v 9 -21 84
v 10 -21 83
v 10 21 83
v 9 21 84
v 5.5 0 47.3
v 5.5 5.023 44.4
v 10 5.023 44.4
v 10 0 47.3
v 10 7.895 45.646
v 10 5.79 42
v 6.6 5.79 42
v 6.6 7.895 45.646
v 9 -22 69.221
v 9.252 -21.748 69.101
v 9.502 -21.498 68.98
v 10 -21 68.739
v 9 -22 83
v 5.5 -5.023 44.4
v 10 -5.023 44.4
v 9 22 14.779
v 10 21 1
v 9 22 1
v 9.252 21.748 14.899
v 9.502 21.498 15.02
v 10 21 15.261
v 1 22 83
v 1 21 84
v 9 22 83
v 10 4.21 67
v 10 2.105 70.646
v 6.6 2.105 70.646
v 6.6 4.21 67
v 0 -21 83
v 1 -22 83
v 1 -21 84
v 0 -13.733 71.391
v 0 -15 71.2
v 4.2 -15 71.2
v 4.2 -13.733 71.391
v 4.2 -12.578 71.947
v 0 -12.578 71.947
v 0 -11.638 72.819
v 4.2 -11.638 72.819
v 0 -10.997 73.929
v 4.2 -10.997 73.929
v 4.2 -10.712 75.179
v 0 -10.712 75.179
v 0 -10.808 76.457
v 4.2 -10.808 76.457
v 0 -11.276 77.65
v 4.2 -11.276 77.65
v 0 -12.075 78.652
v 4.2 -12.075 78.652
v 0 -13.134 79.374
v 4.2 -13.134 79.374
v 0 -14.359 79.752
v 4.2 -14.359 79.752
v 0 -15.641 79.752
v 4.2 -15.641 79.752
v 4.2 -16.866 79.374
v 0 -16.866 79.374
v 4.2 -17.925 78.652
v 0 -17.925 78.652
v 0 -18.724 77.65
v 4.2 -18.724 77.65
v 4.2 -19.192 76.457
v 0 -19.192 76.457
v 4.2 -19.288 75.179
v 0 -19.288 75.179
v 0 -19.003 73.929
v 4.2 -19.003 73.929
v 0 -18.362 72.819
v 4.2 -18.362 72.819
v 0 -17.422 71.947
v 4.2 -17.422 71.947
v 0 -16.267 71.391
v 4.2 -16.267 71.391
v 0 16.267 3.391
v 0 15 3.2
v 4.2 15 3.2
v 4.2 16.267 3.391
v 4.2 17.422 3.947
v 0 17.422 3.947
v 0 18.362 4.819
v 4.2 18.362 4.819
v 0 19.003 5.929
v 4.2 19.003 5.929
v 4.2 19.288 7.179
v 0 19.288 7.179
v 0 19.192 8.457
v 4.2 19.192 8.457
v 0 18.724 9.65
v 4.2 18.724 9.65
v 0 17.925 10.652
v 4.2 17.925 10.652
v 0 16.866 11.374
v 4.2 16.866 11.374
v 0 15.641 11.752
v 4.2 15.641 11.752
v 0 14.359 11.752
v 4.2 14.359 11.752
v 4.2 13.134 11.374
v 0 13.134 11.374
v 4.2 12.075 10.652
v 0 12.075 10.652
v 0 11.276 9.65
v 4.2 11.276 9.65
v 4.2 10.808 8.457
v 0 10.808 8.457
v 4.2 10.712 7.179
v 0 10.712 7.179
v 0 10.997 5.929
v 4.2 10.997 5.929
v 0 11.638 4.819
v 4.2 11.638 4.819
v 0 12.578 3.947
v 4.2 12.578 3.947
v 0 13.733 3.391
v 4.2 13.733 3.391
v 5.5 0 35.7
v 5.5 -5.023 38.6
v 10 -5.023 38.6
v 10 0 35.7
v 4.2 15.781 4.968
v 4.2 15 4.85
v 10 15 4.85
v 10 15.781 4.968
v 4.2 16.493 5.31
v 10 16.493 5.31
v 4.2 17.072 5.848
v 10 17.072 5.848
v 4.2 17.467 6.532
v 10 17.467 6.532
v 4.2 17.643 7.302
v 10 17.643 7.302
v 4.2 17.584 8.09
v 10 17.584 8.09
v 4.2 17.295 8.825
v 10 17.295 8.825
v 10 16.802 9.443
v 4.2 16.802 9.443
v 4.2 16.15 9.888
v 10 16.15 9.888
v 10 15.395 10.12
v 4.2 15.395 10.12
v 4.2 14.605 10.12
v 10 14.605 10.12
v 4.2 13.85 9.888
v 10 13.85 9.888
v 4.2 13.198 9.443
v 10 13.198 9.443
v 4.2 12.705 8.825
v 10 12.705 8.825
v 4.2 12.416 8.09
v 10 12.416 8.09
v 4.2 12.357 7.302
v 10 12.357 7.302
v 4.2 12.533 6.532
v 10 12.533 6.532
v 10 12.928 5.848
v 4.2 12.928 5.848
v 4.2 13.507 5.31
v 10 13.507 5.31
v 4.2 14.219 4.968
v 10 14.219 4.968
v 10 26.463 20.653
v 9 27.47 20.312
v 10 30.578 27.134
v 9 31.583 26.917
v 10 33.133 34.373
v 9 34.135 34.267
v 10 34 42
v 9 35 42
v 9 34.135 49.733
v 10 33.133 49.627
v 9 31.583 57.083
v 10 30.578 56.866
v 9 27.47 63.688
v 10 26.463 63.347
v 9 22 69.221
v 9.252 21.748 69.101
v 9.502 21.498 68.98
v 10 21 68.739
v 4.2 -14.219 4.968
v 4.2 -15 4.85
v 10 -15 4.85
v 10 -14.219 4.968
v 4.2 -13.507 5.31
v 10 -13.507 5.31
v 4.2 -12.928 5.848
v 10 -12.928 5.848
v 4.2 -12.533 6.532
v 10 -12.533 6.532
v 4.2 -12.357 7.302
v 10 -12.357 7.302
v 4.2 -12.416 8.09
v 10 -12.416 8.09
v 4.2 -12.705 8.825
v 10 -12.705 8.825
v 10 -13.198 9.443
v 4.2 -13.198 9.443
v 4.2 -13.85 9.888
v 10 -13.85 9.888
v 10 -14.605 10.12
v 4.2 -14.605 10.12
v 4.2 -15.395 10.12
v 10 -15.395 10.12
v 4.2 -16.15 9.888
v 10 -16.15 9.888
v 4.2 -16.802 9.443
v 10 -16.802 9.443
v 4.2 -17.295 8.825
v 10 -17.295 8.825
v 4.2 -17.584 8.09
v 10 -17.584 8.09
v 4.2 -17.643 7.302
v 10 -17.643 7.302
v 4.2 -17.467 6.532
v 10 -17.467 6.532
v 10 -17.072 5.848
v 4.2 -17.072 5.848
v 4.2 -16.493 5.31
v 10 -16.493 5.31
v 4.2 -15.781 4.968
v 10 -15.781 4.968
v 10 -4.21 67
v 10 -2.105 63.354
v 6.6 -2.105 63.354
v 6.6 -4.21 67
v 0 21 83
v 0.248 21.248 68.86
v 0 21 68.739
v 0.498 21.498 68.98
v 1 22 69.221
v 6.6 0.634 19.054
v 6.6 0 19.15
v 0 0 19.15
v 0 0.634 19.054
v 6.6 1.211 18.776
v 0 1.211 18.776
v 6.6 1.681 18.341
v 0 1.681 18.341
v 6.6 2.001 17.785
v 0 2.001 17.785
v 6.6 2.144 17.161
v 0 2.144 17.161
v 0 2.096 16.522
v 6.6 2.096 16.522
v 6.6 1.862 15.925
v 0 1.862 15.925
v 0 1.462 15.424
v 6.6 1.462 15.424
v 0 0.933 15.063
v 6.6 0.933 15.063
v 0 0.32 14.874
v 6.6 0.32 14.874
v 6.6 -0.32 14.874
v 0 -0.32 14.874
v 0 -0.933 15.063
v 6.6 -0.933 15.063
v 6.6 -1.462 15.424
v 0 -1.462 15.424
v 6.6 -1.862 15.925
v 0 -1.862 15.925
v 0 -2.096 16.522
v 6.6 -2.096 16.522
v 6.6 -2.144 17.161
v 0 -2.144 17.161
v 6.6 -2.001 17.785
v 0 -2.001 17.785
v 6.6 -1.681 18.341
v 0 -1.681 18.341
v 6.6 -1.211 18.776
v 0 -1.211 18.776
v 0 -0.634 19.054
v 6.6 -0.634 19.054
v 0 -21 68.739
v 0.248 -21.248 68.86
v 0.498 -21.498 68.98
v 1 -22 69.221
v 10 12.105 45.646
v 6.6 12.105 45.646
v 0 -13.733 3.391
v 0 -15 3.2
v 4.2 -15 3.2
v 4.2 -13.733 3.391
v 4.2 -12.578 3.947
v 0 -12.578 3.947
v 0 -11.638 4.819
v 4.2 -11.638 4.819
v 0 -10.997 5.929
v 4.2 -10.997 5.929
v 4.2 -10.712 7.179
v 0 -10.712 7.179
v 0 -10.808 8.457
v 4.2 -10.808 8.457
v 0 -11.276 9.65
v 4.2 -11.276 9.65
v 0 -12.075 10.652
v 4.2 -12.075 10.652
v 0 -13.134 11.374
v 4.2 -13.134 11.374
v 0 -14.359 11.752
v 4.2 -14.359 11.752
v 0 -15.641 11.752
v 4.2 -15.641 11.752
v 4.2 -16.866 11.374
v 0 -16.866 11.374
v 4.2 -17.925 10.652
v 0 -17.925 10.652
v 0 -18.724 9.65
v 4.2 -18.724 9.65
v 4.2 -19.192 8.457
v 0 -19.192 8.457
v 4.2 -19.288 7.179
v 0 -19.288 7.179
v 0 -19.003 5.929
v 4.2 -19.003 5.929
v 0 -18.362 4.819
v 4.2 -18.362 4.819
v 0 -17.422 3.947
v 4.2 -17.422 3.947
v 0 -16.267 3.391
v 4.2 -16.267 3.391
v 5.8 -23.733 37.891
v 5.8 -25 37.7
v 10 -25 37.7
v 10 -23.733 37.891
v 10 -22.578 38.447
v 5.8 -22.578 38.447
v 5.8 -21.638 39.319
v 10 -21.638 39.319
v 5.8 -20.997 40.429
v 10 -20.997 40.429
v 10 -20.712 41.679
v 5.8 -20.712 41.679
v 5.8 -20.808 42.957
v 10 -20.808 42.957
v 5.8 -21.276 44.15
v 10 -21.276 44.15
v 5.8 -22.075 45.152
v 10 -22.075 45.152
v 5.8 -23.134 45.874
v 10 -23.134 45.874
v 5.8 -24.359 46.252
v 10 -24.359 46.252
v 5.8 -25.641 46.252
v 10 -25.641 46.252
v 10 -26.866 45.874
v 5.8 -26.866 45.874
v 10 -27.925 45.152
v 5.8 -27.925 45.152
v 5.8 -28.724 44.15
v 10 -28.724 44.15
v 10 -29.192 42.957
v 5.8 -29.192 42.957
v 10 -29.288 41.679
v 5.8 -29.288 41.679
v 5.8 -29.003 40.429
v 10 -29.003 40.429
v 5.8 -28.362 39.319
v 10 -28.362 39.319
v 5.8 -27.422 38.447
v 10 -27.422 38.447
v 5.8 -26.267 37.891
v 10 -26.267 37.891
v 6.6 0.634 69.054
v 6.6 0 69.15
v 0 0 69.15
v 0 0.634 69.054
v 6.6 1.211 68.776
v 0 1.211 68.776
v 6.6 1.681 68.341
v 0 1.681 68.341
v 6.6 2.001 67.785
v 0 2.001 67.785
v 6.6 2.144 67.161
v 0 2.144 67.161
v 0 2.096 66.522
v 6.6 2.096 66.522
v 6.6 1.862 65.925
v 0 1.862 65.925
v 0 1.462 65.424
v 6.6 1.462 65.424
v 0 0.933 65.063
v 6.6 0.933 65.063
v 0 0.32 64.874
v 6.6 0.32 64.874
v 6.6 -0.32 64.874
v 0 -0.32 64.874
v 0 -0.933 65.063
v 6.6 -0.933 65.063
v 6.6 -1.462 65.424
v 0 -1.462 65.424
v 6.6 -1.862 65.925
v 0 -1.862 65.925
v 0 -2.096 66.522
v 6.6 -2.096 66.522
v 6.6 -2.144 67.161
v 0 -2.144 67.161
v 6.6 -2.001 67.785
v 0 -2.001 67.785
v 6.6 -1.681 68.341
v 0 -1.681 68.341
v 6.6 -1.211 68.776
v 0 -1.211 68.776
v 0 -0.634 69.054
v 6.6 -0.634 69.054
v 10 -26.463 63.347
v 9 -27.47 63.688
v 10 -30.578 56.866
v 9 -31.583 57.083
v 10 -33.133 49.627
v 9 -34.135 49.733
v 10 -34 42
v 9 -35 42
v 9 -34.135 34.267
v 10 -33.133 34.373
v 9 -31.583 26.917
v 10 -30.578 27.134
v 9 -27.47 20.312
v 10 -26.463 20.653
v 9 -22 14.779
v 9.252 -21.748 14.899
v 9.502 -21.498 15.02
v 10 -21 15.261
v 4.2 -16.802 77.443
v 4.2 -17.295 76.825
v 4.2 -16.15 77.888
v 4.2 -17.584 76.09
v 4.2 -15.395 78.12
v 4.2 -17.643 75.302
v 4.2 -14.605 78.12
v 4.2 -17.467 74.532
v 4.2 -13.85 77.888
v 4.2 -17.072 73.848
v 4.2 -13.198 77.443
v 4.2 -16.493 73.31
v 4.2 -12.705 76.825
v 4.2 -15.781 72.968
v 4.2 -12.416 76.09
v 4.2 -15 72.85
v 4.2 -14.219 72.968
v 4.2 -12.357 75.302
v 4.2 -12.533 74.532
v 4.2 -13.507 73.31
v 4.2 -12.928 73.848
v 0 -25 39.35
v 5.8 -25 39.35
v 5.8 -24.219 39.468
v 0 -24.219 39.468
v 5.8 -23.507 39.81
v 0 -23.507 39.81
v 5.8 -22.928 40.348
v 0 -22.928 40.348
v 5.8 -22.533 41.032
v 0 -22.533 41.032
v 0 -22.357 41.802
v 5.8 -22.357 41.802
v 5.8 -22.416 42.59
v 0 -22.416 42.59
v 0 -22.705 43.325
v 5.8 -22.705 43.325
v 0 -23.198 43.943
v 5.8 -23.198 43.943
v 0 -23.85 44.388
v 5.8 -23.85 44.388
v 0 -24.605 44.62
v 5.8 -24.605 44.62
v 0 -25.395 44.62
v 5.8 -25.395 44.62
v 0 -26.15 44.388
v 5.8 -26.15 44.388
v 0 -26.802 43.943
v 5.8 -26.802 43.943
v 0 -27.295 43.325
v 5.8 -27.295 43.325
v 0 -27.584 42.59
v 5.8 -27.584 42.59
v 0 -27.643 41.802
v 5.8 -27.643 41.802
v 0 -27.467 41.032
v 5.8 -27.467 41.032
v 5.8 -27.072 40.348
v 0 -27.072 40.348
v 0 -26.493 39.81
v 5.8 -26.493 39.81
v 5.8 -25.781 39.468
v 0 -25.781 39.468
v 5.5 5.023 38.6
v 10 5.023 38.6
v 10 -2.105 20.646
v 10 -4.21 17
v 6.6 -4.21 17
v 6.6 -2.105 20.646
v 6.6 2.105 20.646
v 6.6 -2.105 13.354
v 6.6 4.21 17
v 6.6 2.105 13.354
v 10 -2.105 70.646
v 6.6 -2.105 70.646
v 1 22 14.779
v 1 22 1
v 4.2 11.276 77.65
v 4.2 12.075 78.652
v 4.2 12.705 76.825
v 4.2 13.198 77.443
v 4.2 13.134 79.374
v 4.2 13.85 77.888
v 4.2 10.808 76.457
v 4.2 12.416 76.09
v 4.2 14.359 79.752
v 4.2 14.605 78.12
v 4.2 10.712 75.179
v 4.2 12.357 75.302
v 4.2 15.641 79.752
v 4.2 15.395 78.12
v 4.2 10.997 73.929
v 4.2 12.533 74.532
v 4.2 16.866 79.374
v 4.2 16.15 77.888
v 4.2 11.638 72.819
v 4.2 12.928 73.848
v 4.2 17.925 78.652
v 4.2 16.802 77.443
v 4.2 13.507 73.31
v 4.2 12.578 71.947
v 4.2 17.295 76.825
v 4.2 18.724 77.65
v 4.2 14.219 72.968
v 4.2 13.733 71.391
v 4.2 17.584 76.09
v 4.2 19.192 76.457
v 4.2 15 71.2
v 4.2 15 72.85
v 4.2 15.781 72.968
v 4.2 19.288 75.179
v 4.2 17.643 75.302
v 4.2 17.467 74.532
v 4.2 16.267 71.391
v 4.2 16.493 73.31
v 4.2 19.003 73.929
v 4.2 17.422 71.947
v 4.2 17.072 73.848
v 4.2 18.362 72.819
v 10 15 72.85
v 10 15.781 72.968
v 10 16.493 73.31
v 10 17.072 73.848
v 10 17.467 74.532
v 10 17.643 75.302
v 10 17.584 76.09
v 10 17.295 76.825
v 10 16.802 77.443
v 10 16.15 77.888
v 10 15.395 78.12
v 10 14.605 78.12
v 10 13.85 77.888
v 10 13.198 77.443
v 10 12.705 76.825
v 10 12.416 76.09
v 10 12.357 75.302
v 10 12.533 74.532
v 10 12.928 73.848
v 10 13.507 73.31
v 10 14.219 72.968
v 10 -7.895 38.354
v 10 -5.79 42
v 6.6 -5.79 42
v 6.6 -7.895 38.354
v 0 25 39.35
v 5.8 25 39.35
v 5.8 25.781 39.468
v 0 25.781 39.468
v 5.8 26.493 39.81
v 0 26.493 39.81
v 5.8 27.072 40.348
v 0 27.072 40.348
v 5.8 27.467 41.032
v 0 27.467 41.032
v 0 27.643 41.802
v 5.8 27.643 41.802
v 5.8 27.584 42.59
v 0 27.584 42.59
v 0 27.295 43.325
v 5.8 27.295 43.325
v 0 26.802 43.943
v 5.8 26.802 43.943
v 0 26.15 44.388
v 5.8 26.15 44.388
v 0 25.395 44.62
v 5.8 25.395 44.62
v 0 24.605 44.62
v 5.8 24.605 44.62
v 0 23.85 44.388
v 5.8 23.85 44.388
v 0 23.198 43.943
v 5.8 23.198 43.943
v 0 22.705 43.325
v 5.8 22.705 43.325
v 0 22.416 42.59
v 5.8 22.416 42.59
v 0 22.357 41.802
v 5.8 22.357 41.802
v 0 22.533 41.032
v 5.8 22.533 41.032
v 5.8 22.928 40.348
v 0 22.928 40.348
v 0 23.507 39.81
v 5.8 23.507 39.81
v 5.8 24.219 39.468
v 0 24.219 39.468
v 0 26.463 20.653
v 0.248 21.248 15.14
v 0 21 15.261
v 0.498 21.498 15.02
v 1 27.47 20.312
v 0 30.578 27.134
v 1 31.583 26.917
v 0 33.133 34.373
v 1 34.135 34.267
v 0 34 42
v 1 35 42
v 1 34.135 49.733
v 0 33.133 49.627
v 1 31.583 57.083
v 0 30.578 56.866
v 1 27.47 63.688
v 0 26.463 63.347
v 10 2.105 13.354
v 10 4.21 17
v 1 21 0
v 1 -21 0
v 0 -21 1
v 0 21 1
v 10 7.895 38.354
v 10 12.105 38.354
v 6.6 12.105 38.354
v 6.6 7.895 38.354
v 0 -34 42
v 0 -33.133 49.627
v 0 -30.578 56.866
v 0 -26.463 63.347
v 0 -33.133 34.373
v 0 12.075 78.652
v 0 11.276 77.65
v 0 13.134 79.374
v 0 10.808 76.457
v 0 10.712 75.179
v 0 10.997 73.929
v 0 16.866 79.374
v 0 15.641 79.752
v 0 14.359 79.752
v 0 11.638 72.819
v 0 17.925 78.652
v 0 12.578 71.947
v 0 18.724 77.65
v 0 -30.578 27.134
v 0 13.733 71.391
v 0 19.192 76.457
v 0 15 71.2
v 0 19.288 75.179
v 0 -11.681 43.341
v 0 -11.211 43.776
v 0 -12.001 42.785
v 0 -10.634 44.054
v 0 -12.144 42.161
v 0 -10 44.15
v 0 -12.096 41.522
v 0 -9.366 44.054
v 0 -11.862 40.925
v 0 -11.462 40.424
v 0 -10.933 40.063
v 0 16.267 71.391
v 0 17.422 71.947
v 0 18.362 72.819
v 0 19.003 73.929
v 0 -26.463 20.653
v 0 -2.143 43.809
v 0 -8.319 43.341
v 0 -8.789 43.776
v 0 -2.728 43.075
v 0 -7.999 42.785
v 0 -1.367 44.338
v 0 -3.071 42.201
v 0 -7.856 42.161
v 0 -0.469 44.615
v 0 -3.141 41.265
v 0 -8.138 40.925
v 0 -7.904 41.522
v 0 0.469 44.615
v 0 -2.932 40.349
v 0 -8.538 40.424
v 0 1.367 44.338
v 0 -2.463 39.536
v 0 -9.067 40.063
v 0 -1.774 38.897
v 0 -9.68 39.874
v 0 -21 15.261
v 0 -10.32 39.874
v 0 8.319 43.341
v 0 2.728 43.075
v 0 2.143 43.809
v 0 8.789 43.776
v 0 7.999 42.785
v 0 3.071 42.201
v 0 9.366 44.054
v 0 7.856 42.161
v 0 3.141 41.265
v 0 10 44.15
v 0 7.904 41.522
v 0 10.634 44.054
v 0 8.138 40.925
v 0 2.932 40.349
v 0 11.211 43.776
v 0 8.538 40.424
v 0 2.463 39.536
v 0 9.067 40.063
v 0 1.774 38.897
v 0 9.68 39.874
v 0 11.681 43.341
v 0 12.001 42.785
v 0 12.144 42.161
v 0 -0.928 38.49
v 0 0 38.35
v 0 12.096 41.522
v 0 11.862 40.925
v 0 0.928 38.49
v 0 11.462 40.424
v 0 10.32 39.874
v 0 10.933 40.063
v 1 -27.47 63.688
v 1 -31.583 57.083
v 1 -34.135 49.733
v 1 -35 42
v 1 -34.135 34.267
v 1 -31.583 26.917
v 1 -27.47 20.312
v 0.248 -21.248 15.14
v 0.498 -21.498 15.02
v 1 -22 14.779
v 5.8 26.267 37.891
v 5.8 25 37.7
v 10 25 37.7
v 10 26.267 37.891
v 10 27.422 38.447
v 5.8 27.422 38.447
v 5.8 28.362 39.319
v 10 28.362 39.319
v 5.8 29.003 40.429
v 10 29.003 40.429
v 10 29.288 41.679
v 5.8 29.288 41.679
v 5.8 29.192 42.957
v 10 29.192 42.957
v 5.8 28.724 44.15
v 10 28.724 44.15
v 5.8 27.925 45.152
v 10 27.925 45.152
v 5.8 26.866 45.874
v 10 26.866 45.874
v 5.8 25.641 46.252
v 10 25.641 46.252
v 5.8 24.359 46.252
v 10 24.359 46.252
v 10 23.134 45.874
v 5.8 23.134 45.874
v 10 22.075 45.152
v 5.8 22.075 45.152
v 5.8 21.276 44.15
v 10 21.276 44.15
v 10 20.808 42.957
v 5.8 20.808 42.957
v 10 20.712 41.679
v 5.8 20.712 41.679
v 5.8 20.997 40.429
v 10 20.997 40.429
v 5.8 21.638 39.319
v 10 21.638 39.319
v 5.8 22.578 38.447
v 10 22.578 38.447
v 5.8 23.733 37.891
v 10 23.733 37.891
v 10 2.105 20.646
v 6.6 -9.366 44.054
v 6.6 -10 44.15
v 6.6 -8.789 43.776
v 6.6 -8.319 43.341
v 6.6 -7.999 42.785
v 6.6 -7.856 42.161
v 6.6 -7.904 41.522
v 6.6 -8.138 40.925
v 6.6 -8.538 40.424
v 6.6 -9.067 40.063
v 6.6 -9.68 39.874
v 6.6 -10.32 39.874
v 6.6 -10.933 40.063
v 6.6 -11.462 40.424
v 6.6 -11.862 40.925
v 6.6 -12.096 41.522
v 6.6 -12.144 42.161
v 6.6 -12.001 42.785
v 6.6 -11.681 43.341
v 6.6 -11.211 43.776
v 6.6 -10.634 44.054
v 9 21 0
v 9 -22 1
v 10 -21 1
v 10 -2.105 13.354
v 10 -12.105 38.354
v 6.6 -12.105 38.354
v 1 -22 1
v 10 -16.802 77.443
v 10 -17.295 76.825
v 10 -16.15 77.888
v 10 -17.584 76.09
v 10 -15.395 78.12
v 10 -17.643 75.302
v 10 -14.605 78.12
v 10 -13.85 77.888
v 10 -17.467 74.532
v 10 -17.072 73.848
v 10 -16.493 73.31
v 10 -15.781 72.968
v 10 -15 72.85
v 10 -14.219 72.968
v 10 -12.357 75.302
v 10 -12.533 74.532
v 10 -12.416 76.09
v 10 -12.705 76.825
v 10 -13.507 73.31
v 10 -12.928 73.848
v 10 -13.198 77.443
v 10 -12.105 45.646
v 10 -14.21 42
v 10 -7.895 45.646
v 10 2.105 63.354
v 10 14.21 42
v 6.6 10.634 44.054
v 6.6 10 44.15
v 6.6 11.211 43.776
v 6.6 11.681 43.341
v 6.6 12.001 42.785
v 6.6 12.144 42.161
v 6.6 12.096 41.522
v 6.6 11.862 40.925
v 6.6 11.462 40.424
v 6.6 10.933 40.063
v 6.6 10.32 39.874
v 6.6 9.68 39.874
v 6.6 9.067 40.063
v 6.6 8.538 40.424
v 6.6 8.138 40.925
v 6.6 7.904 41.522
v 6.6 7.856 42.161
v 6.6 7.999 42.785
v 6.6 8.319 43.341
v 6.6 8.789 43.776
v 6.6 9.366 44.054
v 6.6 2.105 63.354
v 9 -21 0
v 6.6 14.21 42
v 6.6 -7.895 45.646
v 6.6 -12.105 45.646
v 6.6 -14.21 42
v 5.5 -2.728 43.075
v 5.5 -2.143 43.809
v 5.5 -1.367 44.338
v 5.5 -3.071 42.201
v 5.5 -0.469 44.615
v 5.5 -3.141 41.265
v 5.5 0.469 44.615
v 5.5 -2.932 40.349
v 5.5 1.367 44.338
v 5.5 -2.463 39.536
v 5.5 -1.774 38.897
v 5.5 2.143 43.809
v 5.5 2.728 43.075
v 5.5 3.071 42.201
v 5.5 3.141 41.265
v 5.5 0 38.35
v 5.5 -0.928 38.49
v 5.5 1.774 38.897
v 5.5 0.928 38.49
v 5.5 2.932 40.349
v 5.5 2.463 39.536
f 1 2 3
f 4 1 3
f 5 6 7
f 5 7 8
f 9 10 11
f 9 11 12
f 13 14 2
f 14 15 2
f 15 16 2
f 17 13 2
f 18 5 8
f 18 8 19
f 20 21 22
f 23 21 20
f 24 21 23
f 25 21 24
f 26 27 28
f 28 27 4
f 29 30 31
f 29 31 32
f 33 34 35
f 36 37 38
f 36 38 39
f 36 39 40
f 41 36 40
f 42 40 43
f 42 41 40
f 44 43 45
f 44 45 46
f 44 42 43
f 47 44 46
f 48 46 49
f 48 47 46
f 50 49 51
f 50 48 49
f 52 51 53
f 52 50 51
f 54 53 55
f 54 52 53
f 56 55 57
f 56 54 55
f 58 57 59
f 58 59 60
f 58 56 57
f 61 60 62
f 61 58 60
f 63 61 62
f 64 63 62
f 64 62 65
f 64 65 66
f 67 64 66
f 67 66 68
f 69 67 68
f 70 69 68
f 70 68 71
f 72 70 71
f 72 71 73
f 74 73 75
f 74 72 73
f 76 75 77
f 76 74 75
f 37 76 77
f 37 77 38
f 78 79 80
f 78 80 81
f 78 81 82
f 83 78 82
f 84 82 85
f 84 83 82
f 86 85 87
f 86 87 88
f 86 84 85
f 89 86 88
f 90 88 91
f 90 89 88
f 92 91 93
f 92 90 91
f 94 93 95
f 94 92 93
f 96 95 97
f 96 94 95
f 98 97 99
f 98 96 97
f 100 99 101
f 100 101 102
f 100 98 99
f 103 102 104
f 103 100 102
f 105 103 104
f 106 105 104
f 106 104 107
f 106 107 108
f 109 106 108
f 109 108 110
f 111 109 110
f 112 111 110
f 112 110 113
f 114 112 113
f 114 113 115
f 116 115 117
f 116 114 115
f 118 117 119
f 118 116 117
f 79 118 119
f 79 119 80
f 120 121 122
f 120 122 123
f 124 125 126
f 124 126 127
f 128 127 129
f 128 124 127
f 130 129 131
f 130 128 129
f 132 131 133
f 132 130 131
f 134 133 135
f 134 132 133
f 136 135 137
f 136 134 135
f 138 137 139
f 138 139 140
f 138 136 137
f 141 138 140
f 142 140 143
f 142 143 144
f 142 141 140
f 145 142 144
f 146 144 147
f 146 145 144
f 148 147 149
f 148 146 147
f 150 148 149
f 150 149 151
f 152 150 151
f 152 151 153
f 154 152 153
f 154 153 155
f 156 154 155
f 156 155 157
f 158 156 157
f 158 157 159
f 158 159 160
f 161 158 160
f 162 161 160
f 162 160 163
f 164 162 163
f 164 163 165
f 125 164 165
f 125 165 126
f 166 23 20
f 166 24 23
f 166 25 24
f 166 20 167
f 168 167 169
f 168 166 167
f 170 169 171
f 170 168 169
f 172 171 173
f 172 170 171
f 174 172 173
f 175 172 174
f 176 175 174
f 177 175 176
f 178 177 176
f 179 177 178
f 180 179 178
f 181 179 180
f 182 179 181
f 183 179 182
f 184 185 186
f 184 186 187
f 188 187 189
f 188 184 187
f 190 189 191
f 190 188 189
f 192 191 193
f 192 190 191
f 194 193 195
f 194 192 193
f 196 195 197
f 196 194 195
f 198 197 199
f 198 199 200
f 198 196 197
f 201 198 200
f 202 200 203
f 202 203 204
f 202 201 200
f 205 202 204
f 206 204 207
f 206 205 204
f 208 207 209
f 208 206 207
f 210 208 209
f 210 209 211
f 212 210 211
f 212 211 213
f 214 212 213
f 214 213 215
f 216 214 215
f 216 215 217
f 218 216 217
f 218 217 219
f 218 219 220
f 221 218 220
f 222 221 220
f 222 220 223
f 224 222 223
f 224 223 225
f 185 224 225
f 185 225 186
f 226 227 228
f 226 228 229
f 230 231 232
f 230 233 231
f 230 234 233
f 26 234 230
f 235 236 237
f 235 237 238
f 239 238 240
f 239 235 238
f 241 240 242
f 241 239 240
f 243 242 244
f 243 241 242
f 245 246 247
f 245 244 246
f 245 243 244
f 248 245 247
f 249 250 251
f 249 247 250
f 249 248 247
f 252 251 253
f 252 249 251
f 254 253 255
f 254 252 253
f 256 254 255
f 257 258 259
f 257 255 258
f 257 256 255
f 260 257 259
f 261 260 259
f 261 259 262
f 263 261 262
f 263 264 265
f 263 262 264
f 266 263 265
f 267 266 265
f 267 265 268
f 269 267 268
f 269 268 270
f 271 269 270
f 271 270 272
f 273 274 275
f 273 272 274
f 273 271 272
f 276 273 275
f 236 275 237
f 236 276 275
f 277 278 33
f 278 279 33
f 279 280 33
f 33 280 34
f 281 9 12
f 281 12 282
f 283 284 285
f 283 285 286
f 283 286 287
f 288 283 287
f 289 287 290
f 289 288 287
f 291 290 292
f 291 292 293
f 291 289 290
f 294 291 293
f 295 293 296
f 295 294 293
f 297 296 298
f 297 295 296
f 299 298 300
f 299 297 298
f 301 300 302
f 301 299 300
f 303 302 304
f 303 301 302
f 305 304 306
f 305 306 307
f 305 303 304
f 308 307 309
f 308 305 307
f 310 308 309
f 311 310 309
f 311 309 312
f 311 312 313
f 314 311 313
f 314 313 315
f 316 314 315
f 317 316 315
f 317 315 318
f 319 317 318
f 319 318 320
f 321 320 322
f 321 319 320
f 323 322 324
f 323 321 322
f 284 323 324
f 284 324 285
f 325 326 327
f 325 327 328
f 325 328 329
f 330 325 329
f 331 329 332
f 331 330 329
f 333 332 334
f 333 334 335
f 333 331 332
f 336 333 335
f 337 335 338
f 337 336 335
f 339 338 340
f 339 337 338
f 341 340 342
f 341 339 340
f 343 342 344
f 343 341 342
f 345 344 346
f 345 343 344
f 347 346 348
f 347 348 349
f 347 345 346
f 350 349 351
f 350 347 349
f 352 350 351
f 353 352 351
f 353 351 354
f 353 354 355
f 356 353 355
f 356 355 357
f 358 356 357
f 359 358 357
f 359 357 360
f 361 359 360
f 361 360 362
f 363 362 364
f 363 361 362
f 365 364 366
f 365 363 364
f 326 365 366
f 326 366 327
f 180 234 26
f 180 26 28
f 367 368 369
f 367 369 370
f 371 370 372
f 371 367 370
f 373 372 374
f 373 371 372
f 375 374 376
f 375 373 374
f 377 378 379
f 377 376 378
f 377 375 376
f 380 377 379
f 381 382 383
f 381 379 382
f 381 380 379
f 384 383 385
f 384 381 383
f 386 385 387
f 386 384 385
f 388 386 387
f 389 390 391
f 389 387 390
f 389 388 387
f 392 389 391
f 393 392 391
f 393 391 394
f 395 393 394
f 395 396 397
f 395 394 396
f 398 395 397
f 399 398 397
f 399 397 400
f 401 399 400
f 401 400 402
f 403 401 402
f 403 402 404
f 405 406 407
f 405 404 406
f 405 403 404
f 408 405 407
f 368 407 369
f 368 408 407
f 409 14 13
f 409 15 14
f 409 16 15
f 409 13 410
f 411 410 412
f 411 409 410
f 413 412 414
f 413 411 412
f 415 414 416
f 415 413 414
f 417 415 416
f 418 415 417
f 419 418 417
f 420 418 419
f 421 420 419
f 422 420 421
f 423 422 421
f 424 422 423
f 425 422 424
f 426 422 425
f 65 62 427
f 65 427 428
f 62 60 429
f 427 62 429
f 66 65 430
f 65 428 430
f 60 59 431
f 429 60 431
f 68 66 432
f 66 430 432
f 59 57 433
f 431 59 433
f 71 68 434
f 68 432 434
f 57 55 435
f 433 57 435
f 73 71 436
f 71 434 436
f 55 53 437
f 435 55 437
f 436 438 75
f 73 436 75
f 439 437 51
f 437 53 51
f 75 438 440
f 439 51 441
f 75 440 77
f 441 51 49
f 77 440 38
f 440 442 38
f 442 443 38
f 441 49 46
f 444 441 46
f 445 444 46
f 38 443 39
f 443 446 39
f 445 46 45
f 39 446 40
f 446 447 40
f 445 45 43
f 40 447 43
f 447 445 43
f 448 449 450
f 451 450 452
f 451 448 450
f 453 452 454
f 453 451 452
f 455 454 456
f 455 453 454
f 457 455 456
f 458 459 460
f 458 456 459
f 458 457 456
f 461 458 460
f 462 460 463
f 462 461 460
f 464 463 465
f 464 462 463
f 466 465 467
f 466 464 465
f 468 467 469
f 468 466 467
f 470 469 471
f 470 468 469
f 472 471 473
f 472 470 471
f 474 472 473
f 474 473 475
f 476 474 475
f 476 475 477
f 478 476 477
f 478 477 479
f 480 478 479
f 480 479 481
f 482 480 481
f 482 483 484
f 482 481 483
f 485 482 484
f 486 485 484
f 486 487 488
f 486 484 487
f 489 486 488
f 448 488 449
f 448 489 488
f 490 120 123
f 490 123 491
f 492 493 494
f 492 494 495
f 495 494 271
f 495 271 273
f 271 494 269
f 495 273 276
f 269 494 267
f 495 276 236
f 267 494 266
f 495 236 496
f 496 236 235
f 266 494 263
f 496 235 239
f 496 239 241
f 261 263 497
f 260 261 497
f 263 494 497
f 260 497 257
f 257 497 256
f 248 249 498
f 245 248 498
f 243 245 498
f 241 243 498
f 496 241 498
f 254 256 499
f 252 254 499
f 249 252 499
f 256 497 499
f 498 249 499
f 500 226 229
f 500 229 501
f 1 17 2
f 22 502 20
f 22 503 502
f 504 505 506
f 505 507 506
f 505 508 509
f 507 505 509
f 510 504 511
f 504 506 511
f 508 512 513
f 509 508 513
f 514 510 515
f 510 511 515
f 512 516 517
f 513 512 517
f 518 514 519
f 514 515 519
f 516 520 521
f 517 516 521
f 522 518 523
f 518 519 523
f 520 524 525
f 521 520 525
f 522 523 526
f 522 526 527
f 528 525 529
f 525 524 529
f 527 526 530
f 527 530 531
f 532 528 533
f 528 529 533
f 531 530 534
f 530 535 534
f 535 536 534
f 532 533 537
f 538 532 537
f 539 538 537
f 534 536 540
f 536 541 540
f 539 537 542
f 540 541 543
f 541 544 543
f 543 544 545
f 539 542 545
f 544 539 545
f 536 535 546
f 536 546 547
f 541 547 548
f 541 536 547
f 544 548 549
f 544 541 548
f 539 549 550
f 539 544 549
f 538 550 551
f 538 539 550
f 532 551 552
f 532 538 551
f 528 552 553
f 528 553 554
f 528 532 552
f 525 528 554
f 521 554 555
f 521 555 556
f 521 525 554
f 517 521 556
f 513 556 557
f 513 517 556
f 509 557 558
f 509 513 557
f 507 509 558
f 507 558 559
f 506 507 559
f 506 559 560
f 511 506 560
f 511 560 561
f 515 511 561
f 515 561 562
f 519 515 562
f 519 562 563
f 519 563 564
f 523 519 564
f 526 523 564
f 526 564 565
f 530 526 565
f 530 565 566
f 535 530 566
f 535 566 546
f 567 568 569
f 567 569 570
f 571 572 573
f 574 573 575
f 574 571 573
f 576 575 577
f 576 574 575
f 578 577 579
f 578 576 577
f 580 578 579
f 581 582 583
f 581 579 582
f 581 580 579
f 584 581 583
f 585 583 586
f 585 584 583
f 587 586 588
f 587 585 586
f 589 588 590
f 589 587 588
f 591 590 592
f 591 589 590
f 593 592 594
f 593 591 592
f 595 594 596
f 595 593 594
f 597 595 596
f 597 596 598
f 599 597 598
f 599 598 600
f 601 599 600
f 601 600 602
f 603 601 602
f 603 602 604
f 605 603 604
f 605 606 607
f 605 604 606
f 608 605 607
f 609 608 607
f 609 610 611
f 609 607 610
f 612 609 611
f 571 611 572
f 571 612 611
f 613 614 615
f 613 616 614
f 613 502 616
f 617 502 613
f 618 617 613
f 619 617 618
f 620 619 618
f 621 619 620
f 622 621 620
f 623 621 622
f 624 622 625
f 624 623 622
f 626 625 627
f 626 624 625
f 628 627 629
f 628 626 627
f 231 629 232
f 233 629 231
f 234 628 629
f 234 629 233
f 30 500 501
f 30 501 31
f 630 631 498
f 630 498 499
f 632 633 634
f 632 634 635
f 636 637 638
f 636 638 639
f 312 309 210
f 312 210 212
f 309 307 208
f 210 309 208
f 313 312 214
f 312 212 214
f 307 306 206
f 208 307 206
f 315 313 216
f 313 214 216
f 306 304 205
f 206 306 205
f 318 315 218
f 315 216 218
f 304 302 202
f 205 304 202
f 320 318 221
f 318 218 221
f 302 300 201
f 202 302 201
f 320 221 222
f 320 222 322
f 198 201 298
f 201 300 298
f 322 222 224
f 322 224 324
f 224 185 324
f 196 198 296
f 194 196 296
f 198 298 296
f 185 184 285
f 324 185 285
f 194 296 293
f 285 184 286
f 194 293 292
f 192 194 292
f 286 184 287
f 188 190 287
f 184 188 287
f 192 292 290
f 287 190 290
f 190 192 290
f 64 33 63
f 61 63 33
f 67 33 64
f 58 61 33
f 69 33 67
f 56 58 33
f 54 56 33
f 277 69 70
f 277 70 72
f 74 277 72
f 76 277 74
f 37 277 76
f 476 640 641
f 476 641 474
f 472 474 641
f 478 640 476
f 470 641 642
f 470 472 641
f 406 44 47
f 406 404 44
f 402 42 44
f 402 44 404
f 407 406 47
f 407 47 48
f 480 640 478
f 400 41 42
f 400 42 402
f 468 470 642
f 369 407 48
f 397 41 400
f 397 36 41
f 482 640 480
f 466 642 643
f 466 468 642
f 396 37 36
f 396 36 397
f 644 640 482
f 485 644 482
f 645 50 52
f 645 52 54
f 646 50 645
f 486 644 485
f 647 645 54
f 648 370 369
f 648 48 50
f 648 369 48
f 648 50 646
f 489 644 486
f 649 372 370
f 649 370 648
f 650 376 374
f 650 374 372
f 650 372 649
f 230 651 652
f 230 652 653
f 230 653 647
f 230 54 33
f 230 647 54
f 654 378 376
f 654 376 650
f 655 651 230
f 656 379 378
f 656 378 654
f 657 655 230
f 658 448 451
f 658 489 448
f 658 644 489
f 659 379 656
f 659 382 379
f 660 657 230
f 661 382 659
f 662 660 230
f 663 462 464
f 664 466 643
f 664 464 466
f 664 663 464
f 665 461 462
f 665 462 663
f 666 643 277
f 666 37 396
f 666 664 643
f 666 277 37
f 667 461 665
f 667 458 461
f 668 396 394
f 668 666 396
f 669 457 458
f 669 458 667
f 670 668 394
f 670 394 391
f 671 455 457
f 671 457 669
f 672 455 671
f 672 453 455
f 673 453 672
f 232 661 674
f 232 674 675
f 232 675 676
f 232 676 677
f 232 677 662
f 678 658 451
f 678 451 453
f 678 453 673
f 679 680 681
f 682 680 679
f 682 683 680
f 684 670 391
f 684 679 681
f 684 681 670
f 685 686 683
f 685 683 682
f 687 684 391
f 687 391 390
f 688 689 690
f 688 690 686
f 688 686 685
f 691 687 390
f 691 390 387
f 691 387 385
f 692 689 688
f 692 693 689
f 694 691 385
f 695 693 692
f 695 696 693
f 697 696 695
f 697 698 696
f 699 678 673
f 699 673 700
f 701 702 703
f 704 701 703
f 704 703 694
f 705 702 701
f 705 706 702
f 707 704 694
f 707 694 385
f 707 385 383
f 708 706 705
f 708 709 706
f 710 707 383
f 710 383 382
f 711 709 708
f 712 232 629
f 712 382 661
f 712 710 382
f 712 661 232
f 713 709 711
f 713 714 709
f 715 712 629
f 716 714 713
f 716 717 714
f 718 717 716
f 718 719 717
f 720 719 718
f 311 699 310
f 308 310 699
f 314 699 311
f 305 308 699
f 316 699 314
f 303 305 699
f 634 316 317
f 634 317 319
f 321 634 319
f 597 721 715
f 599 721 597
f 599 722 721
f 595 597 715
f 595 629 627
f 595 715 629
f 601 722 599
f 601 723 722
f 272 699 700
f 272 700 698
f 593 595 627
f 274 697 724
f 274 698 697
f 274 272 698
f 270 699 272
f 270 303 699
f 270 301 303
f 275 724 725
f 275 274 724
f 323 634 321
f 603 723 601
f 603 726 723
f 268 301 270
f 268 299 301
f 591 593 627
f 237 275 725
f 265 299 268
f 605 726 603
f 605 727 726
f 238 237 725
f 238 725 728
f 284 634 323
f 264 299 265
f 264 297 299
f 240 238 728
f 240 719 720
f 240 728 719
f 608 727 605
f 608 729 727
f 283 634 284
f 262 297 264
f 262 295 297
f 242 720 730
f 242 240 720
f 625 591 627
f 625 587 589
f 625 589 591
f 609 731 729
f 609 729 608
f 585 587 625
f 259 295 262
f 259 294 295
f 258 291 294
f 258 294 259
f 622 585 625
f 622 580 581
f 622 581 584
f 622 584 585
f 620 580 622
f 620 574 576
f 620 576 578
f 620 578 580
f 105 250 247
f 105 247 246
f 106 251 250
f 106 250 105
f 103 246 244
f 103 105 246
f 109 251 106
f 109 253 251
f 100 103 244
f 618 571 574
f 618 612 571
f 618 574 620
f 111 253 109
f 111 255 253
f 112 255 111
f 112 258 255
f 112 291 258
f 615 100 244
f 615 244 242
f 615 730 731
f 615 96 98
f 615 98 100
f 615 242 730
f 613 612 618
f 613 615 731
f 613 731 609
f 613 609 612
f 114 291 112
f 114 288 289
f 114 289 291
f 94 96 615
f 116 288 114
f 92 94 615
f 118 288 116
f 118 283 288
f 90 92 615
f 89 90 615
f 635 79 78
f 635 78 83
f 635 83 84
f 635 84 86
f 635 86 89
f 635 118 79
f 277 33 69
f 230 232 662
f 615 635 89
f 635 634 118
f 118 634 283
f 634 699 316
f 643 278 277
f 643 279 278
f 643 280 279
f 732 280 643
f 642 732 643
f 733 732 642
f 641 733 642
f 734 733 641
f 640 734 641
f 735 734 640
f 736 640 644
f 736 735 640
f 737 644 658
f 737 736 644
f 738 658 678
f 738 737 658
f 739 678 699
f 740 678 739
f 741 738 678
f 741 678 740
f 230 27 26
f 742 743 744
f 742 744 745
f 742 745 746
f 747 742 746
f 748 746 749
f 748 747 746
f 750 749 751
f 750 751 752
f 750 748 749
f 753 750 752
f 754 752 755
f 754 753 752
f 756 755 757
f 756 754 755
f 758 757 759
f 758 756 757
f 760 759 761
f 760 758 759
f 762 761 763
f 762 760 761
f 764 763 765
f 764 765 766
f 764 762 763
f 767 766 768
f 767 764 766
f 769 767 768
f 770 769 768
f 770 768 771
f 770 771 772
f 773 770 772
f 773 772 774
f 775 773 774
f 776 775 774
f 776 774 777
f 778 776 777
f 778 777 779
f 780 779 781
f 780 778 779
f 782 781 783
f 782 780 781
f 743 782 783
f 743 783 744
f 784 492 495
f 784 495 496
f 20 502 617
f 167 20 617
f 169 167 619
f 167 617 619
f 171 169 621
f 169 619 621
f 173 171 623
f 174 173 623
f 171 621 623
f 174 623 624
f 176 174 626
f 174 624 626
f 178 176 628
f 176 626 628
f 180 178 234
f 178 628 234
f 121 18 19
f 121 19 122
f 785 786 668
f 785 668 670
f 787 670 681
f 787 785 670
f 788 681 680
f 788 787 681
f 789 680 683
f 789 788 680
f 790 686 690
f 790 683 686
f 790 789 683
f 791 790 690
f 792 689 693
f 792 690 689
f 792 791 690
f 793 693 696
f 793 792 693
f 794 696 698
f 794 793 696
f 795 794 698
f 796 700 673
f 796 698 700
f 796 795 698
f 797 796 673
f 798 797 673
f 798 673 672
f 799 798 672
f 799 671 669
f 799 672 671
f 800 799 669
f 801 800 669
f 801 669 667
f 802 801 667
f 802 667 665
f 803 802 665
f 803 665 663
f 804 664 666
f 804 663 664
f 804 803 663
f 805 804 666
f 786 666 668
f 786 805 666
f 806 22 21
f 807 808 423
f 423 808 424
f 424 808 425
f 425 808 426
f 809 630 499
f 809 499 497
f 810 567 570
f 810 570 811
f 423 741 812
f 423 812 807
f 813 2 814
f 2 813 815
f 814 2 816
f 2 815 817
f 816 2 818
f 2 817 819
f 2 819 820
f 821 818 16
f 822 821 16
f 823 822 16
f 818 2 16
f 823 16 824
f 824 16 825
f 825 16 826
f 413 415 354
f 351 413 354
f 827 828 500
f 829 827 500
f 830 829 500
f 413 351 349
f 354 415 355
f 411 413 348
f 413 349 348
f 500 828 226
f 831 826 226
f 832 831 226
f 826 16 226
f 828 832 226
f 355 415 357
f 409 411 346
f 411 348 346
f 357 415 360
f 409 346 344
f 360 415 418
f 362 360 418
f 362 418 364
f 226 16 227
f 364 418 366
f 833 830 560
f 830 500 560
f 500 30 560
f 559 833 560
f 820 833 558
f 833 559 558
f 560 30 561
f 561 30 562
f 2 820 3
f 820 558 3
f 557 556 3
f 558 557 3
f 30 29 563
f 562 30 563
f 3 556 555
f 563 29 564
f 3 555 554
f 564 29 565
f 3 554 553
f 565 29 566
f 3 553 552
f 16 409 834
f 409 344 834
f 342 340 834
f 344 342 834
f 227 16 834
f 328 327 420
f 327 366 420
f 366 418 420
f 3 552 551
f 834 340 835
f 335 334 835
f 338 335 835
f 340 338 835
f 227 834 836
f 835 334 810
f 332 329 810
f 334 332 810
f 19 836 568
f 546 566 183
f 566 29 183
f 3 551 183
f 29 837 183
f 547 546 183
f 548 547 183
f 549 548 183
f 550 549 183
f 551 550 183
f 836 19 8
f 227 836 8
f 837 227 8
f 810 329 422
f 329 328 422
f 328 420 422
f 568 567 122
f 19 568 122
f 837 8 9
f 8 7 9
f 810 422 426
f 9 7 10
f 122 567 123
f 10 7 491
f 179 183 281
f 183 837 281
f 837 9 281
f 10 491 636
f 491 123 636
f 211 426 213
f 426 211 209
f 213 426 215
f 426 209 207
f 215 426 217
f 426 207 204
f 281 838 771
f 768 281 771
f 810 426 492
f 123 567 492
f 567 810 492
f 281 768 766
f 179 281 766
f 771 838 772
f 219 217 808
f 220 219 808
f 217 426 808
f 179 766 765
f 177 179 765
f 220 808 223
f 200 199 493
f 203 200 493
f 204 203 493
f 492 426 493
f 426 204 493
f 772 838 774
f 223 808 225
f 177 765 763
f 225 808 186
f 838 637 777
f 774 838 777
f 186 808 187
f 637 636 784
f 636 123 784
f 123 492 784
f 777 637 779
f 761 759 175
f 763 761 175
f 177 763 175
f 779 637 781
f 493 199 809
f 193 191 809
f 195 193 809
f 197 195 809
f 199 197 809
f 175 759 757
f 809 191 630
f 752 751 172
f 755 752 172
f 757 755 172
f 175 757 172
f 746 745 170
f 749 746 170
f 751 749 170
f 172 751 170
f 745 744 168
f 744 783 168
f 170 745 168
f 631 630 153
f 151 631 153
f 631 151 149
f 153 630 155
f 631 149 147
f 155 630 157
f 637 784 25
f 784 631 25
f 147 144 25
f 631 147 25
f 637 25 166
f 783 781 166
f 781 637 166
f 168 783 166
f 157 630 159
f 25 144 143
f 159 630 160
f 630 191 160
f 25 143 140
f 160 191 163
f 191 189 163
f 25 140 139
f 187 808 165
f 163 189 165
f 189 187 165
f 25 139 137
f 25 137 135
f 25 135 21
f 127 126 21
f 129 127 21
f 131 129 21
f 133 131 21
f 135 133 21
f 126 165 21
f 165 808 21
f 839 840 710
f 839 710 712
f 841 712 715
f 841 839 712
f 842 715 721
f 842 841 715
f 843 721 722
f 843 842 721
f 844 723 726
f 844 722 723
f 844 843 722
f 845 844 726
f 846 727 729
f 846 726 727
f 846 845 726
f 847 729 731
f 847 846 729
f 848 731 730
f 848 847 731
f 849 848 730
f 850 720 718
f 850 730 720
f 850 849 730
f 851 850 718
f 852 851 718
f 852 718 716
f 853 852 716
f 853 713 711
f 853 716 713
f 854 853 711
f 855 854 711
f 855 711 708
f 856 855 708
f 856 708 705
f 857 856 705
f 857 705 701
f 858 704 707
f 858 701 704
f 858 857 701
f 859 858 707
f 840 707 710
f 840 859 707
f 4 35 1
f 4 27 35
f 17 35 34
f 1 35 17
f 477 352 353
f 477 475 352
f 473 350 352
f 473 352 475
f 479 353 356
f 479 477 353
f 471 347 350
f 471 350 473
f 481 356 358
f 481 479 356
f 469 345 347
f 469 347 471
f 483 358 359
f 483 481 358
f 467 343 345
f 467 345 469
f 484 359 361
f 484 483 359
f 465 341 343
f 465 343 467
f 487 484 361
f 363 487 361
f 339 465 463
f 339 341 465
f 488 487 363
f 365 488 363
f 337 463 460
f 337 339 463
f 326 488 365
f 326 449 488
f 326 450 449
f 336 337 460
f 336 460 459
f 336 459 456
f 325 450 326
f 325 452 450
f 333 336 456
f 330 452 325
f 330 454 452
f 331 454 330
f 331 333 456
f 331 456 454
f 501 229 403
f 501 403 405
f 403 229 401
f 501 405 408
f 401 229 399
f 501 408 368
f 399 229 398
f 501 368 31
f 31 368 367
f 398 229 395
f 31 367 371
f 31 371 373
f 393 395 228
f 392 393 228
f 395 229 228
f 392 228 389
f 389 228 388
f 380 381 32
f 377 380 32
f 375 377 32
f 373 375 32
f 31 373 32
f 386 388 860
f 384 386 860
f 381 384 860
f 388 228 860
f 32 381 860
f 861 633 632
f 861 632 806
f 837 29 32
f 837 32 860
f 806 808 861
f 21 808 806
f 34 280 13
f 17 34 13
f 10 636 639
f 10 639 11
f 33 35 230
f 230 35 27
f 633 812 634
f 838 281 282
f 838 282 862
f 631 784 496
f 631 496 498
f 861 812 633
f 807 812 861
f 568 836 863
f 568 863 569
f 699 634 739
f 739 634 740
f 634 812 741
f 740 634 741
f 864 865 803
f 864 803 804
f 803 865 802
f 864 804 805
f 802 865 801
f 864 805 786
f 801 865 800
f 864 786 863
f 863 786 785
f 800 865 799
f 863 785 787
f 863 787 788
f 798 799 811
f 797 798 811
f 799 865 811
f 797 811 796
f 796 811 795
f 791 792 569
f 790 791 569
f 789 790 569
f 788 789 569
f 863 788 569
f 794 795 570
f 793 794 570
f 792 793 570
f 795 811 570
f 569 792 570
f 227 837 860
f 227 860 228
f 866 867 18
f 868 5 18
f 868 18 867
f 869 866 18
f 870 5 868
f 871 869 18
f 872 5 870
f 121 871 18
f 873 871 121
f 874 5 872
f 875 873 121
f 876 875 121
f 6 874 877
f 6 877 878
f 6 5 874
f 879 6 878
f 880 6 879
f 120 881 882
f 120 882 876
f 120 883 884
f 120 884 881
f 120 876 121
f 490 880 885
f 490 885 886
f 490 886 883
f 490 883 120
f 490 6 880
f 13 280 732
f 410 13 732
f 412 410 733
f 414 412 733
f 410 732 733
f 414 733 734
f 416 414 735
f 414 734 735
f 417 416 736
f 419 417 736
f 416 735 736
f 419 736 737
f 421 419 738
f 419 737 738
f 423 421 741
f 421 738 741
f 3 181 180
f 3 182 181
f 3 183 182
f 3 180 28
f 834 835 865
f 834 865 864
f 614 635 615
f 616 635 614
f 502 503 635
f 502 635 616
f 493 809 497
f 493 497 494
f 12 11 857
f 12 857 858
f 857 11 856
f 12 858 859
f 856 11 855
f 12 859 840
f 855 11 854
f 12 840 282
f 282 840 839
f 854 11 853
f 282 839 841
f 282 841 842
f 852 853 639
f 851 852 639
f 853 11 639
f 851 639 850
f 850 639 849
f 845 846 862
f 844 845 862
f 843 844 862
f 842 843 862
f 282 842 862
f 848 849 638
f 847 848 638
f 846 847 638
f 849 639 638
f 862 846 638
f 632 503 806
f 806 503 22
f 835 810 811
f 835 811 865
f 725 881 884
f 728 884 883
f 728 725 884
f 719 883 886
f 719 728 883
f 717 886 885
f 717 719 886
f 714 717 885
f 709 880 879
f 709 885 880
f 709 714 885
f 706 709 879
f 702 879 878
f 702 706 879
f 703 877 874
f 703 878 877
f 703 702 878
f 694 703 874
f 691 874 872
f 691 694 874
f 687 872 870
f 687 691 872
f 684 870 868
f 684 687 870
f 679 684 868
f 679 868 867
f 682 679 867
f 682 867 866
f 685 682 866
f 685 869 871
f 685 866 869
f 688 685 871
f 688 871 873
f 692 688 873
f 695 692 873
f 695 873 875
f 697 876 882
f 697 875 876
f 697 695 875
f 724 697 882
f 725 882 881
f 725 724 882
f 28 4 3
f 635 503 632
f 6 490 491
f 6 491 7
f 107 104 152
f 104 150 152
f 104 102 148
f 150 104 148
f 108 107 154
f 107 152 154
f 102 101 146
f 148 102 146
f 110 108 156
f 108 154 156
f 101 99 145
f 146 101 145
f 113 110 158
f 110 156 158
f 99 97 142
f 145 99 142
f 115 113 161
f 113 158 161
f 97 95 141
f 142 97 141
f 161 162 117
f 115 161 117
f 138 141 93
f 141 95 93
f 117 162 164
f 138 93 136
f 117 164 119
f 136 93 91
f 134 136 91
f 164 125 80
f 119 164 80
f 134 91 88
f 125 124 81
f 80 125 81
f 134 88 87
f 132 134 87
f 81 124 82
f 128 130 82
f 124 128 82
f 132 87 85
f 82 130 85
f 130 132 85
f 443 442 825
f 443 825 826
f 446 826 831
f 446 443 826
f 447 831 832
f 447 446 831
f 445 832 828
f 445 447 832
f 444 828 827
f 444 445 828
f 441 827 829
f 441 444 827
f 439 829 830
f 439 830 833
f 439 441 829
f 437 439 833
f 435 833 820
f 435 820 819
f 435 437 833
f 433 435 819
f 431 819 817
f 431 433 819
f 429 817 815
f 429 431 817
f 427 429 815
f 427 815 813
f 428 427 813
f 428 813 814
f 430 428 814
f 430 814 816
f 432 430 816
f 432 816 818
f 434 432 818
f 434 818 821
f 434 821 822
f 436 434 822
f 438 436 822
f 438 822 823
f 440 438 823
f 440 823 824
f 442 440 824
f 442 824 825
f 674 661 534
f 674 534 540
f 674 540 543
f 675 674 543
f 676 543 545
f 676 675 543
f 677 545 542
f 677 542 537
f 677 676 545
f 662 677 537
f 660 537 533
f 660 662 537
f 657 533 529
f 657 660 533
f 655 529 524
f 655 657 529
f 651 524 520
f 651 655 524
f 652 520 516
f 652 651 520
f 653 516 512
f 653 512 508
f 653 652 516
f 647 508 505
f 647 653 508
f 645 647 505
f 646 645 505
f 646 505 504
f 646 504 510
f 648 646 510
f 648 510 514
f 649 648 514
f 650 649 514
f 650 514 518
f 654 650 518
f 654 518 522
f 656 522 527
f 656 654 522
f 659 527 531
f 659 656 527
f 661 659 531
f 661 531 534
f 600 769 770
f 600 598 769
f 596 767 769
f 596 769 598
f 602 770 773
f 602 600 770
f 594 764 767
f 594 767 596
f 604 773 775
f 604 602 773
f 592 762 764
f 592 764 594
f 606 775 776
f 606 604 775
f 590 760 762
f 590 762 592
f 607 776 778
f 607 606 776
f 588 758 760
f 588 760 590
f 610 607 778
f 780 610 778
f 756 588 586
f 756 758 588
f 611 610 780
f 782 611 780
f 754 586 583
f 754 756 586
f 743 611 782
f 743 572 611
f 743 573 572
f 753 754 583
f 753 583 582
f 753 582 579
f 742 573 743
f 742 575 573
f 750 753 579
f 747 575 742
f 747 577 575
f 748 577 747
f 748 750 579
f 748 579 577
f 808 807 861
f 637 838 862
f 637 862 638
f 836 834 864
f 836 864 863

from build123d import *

# Parameters (mm, degrees)
CYLINDER014005932_R                                                    = 2.65
CYLINDER014005932_DEPTH                                                = 10
CYLINDER014005933_R                                                    = 2.65
CYLINDER014005933_DEPTH                                                = 10
CYLINDER014005934_R                                                    = 2.65
CYLINDER014005934_DEPTH                                                = 10
CYLINDER014005935_R                                                    = 4.3
CYLINDER014005935_DEPTH                                                = 4.2
CYLINDER014005936_R                                                    = 4.3
CYLINDER014005936_DEPTH                                                = 4.2
CYLINDER014005937_R                                                    = 4.3
CYLINDER014005937_DEPTH                                                = 4.2
CYLINDER014005938_R                                                    = 4.3
CYLINDER014005938_DEPTH                                                = 4.2
CYLINDER014005939_R                                                    = 2.65
CYLINDER014005939_DEPTH                                                = 10
CYLINDER014005940_R                                                    = 2.65
CYLINDER014005940_DEPTH                                                = 10
CYLINDER014005941_R                                                    = 4.3
CYLINDER014005941_DEPTH                                                = 4.2
CYLINDER014005942_R                                                    = 4.3
CYLINDER014005942_DEPTH                                                = 4.2
CYLINDER014005943_R                                                    = 3.15
CYLINDER014005943_DEPTH                                                = 10
PRISM010_DEPTH                                                         = 4.5
PRISM018_DEPTH                                                         = 3.4
CYLINDER014005962027_R                                                 = 2.15
CYLINDER014005962027_DEPTH                                             = 16
FUSION001089102007007003008034028016007006009018009018_PLACEMENT_ANGLE = 90
CYLINDER014005931_R                                                    = 2.65
CYLINDER014005931_DEPTH                                                = 10
BOX021002_W                                                            = 10
BOX021002_H                                                            = 44
BOX021002_DEPTH                                                        = 84
CYLINDER014005928_R                                                    = 35
CYLINDER014005928_DEPTH                                                = 10
CUT009003003009003003003007003002_PLACEMENT_ANGLE                      = 90
CHAMFER017_SIZE                                                        = 1
CHAMFER017_PLACEMENT_ANGLE                                             = 90


with BuildPart() as v_lec842:
    # Cylinder014005932 → Cylinder014005932 (new body)
    with BuildSketch(Plane(origin=(0, 15, 7.5), x_dir=(0, 0, -1), z_dir=(1, 0, 0))):
        Circle(CYLINDER014005932_R)
    extrude(amount=CYLINDER014005932_DEPTH)


with BuildPart() as v_lec843:
    # Cylinder014005933 → Cylinder014005933 (new body)
    with BuildSketch(Plane(origin=(0, -15, 75.5), x_dir=(0, 0, -1), z_dir=(1, 0, 0))):
        Circle(CYLINDER014005933_R)
    extrude(amount=CYLINDER014005933_DEPTH)


with BuildPart() as v_lec844:
    # Cylinder014005934 → Cylinder014005934 (new body)
    with BuildSketch(Plane(origin=(0, 15, 75.5), x_dir=(0, 0, -1), z_dir=(1, 0, 0))):
        Circle(CYLINDER014005934_R)
    extrude(amount=CYLINDER014005934_DEPTH)


with BuildPart() as v_lec845:
    # Cylinder014005935 → Cylinder014005935 (new body)
    with BuildSketch(Plane(origin=(0, -15, 7.5), x_dir=(0, 0, -1), z_dir=(1, 0, 0))):
        Circle(CYLINDER014005935_R)
    extrude(amount=CYLINDER014005935_DEPTH)


with BuildPart() as v_lec846:
    # Cylinder014005936 → Cylinder014005936 (new body)
    with BuildSketch(Plane(origin=(0, 15, 7.5), x_dir=(0, 0, -1), z_dir=(1, 0, 0))):
        Circle(CYLINDER014005936_R)
    extrude(amount=CYLINDER014005936_DEPTH)


with BuildPart() as v_lec847:
    # Cylinder014005937 → Cylinder014005937 (new body)
    with BuildSketch(Plane(origin=(0, -15, 75.5), x_dir=(0, 0, -1), z_dir=(1, 0, 0))):
        Circle(CYLINDER014005937_R)
    extrude(amount=CYLINDER014005937_DEPTH)


with BuildPart() as v_lec848:
    # Cylinder014005938 → Cylinder014005938 (new body)
    with BuildSketch(Plane(origin=(0, 15, 75.5), x_dir=(0, 0, -1), z_dir=(1, 0, 0))):
        Circle(CYLINDER014005938_R)
    extrude(amount=CYLINDER014005938_DEPTH)


with BuildPart() as v_lec849:
    # Cylinder014005939 → Cylinder014005939 (new body)
    with BuildSketch(Plane(origin=(0, -25, 42), x_dir=(0, 0, -1), z_dir=(1, 0, 0))):
        Circle(CYLINDER014005939_R)
    extrude(amount=CYLINDER014005939_DEPTH)


with BuildPart() as v_lec850:
    # Cylinder014005940 → Cylinder014005940 (new body)
    with BuildSketch(Plane(origin=(0, 25, 42), x_dir=(0, 0, -1), z_dir=(1, 0, 0))):
        Circle(CYLINDER014005940_R)
    extrude(amount=CYLINDER014005940_DEPTH)


with BuildPart() as v_lec851:
    # Cylinder014005941 → Cylinder014005941 (new body)
    with BuildSketch(Plane(origin=(5.8, -25, 42), x_dir=(0, 0, -1), z_dir=(1, 0, 0))):
        Circle(CYLINDER014005941_R)
    extrude(amount=CYLINDER014005941_DEPTH)


with BuildPart() as v_lec852:
    # Cylinder014005942 → Cylinder014005942 (new body)
    with BuildSketch(Plane(origin=(5.8, 25, 42), x_dir=(0, 0, -1), z_dir=(1, 0, 0))):
        Circle(CYLINDER014005942_R)
    extrude(amount=CYLINDER014005942_DEPTH)


with BuildPart() as v_lec853:
    # Cylinder014005943 → Cylinder014005943 (new body)
    with BuildSketch(Plane(origin=(0, 0, 0), x_dir=(0, 0, -1), z_dir=(1, 0, 0))):
        Circle(CYLINDER014005943_R)
    extrude(amount=CYLINDER014005943_DEPTH)


with BuildPart() as fusion001089102007007003008034028016004:
    # Prism010 → Prism010 (new body)
    with BuildSketch(Plane(origin=(5.5, 0, 0), x_dir=(0, 0, -1), z_dir=(1, 0, 0))):
        Polygon((5.8, 0), (2.9, 5.022947), (-2.9, 5.022947), (-5.8, 0), (-2.9, -5.022947), (2.9, -5.022947), align=None)
    extrude(amount=PRISM010_DEPTH)

    # Fusion001089102007007003008034028016004: union Válec853
    add(v_lec853.part)


with BuildPart() as fusion001089102007007003008034028016004_1:
    # Fusion001089102007007003008034028016004 placement: moved
    add(fusion001089102007007003008034028016004.part.moved(Location((0, 0, 41.5))))


with BuildPart() as m4x010:
    # prism018 → prism018 (new body)
    with BuildSketch(Plane(origin=(0, 0, 0), x_dir=(0, 1, 0), z_dir=(0, 0, 1))):
        Polygon((4.21, 0), (2.105, 3.645967), (-2.105, 3.645967), (-4.21, 0), (-2.105, -3.645967), (2.105, -3.645967), align=None)
    extrude(amount=PRISM018_DEPTH)


with BuildPart() as m4nut042:
    # Cylinder014005962027 → Cylinder014005962027 (new body)
    with BuildSketch(Plane.XY):
        Circle(CYLINDER014005962027_R)
    extrude(amount=CYLINDER014005962027_DEPTH)

    # Fusion001089102007007003008034028016007006009018009018: union M4X010
    add(m4x010.part)


with BuildPart() as m4nut042_1:
    # Fusion001089102007007003008034028016007006009018009018 placement: moved
    add(m4nut042.part.moved(Location((10, 0, 42))).rotate(Axis((10, 0, 42), (0, -1, 0)), FUSION001089102007007003008034028016007006009018009018_PLACEMENT_ANGLE))


with BuildPart() as m4nut043:
    # Fusion001089102007007003008034028016007006009018009019 base: copy of M4nut042
    add(m4nut042_1.part)


with BuildPart() as m4nut043_1:
    # Fusion001089102007007003008034028016007006009018009019 placement: moved
    add(m4nut043.part.moved(Location((0, 10, 0))))


with BuildPart() as m4nut044:
    # Fusion001089102007007003008034028016007006009018009020 base: copy of M4nut042
    add(m4nut042_1.part)


with BuildPart() as m4nut044_1:
    # Fusion001089102007007003008034028016007006009018009020 placement: moved
    add(m4nut044.part.moved(Location((0, -10, 0))))


with BuildPart() as m4nut046:
    # Fusion001089102007007003008034028016007006009018009022 base: copy of M4nut042
    add(m4nut042_1.part)


with BuildPart() as m4nut046_1:
    # Fusion001089102007007003008034028016007006009018009022 placement: moved
    add(m4nut046.part.moved(Location((0, 0, -25))))


with BuildPart() as m4nut045:
    # Fusion001089102007007003008034028016007006009018009021 base: copy of M4nut042
    add(m4nut042_1.part)


with BuildPart() as m4nut045_1:
    # Fusion001089102007007003008034028016007006009018009021 placement: moved
    add(m4nut045.part.moved(Location((0, 0, 25))))


with BuildPart() as fusion001089102007007003008034028016003:
    # Cylinder014005931 → Cylinder014005931 (new body)
    with BuildSketch(Plane(origin=(0, -15, 7.5), x_dir=(0, 0, -1), z_dir=(1, 0, 0))):
        Circle(CYLINDER014005931_R)
    extrude(amount=CYLINDER014005931_DEPTH)

    # Fusion001089102007007003008034028016003: union Válec842, Válec843, Válec844, Válec845, Válec846, Válec847, Válec848, Válec849, Válec850, Válec851, Válec852, Fusion001089102007007003008034028016004, M4nut043, M4nut044, M4nut046, M4nut045
    add(v_lec842.part)
    add(v_lec843.part)
    add(v_lec844.part)
    add(v_lec845.part)
    add(v_lec846.part)
    add(v_lec847.part)
    add(v_lec848.part)
    add(v_lec849.part)
    add(v_lec850.part)
    add(v_lec851.part)
    add(v_lec852.part)
    add(fusion001089102007007003008034028016004_1.part)
    add(m4nut043_1.part)
    add(m4nut044_1.part)
    add(m4nut046_1.part)
    add(m4nut045_1.part)


with BuildPart() as krychle024:
    # Box021002 → Box021002 (new body)
    with BuildSketch(Plane(origin=(0, -22, 0), x_dir=(1, 0, 0), z_dir=(0, 0, 1))):
        with Locations((5, 22)):
            Rectangle(BOX021002_W, BOX021002_H)
    extrude(amount=BOX021002_DEPTH)


with BuildPart() as listade:
    # Cylinder014005928 → Cylinder014005928 (new body)
    with BuildSketch(Plane(origin=(0, 0, 42), x_dir=(0, 0, -1), z_dir=(1, 0, 0))):
        Circle(CYLINDER014005928_R)
    extrude(amount=CYLINDER014005928_DEPTH)

    # Fusion001089102007007003008034028016002: union Krychle024
    add(krychle024.part)

    # Cut009003003009003003003007003002: cut Fusion001089102007007003008034028016003
    add(fusion001089102007007003008034028016003.part, mode=Mode.SUBTRACT)


with BuildPart() as listade_1:
    # Cut009003003009003003003007003002 placement: moved
    add(listade.part.rotate(Axis((0, 0, 0), (1, 0, 0)), CUT009003003009003003003007003002_PLACEMENT_ANGLE))

    # Chamfer017
    chamfer017_edges = [listade_1.edges().sort_by_distance(p)[0] for p in [
        (0, -42, -35),
        (10, -42, -35),
        (10, -76.610658, -22),
        (5, -84, -22),
        (0, -76.610658, -22),
        (0, -84, 0),
        (5, -84, 22),
        (10, -84, 0),
        (10, -76.610658, 22),
        (0, -76.610658, 22),
        (10, -42, 35),
        (0, -42, 35),
        (10, -7.389342, -22),
        (0, -7.389342, -22),
        (5, 0, -22),
        (10, -7.389342, 22),
        (0, -7.389342, 22),
        (5, 0, 22),
        (0, 0, 0),
        (10, 0, 0),
    ]]
    chamfer(chamfer017_edges, length=CHAMFER017_SIZE)


with BuildPart() as listade_2:
    # Chamfer017 placement: moved
    add(listade_1.part.rotate(Axis((0, 0, 0), (-1, 0, 0)), CHAMFER017_PLACEMENT_ANGLE))


solid = listade_2.part
